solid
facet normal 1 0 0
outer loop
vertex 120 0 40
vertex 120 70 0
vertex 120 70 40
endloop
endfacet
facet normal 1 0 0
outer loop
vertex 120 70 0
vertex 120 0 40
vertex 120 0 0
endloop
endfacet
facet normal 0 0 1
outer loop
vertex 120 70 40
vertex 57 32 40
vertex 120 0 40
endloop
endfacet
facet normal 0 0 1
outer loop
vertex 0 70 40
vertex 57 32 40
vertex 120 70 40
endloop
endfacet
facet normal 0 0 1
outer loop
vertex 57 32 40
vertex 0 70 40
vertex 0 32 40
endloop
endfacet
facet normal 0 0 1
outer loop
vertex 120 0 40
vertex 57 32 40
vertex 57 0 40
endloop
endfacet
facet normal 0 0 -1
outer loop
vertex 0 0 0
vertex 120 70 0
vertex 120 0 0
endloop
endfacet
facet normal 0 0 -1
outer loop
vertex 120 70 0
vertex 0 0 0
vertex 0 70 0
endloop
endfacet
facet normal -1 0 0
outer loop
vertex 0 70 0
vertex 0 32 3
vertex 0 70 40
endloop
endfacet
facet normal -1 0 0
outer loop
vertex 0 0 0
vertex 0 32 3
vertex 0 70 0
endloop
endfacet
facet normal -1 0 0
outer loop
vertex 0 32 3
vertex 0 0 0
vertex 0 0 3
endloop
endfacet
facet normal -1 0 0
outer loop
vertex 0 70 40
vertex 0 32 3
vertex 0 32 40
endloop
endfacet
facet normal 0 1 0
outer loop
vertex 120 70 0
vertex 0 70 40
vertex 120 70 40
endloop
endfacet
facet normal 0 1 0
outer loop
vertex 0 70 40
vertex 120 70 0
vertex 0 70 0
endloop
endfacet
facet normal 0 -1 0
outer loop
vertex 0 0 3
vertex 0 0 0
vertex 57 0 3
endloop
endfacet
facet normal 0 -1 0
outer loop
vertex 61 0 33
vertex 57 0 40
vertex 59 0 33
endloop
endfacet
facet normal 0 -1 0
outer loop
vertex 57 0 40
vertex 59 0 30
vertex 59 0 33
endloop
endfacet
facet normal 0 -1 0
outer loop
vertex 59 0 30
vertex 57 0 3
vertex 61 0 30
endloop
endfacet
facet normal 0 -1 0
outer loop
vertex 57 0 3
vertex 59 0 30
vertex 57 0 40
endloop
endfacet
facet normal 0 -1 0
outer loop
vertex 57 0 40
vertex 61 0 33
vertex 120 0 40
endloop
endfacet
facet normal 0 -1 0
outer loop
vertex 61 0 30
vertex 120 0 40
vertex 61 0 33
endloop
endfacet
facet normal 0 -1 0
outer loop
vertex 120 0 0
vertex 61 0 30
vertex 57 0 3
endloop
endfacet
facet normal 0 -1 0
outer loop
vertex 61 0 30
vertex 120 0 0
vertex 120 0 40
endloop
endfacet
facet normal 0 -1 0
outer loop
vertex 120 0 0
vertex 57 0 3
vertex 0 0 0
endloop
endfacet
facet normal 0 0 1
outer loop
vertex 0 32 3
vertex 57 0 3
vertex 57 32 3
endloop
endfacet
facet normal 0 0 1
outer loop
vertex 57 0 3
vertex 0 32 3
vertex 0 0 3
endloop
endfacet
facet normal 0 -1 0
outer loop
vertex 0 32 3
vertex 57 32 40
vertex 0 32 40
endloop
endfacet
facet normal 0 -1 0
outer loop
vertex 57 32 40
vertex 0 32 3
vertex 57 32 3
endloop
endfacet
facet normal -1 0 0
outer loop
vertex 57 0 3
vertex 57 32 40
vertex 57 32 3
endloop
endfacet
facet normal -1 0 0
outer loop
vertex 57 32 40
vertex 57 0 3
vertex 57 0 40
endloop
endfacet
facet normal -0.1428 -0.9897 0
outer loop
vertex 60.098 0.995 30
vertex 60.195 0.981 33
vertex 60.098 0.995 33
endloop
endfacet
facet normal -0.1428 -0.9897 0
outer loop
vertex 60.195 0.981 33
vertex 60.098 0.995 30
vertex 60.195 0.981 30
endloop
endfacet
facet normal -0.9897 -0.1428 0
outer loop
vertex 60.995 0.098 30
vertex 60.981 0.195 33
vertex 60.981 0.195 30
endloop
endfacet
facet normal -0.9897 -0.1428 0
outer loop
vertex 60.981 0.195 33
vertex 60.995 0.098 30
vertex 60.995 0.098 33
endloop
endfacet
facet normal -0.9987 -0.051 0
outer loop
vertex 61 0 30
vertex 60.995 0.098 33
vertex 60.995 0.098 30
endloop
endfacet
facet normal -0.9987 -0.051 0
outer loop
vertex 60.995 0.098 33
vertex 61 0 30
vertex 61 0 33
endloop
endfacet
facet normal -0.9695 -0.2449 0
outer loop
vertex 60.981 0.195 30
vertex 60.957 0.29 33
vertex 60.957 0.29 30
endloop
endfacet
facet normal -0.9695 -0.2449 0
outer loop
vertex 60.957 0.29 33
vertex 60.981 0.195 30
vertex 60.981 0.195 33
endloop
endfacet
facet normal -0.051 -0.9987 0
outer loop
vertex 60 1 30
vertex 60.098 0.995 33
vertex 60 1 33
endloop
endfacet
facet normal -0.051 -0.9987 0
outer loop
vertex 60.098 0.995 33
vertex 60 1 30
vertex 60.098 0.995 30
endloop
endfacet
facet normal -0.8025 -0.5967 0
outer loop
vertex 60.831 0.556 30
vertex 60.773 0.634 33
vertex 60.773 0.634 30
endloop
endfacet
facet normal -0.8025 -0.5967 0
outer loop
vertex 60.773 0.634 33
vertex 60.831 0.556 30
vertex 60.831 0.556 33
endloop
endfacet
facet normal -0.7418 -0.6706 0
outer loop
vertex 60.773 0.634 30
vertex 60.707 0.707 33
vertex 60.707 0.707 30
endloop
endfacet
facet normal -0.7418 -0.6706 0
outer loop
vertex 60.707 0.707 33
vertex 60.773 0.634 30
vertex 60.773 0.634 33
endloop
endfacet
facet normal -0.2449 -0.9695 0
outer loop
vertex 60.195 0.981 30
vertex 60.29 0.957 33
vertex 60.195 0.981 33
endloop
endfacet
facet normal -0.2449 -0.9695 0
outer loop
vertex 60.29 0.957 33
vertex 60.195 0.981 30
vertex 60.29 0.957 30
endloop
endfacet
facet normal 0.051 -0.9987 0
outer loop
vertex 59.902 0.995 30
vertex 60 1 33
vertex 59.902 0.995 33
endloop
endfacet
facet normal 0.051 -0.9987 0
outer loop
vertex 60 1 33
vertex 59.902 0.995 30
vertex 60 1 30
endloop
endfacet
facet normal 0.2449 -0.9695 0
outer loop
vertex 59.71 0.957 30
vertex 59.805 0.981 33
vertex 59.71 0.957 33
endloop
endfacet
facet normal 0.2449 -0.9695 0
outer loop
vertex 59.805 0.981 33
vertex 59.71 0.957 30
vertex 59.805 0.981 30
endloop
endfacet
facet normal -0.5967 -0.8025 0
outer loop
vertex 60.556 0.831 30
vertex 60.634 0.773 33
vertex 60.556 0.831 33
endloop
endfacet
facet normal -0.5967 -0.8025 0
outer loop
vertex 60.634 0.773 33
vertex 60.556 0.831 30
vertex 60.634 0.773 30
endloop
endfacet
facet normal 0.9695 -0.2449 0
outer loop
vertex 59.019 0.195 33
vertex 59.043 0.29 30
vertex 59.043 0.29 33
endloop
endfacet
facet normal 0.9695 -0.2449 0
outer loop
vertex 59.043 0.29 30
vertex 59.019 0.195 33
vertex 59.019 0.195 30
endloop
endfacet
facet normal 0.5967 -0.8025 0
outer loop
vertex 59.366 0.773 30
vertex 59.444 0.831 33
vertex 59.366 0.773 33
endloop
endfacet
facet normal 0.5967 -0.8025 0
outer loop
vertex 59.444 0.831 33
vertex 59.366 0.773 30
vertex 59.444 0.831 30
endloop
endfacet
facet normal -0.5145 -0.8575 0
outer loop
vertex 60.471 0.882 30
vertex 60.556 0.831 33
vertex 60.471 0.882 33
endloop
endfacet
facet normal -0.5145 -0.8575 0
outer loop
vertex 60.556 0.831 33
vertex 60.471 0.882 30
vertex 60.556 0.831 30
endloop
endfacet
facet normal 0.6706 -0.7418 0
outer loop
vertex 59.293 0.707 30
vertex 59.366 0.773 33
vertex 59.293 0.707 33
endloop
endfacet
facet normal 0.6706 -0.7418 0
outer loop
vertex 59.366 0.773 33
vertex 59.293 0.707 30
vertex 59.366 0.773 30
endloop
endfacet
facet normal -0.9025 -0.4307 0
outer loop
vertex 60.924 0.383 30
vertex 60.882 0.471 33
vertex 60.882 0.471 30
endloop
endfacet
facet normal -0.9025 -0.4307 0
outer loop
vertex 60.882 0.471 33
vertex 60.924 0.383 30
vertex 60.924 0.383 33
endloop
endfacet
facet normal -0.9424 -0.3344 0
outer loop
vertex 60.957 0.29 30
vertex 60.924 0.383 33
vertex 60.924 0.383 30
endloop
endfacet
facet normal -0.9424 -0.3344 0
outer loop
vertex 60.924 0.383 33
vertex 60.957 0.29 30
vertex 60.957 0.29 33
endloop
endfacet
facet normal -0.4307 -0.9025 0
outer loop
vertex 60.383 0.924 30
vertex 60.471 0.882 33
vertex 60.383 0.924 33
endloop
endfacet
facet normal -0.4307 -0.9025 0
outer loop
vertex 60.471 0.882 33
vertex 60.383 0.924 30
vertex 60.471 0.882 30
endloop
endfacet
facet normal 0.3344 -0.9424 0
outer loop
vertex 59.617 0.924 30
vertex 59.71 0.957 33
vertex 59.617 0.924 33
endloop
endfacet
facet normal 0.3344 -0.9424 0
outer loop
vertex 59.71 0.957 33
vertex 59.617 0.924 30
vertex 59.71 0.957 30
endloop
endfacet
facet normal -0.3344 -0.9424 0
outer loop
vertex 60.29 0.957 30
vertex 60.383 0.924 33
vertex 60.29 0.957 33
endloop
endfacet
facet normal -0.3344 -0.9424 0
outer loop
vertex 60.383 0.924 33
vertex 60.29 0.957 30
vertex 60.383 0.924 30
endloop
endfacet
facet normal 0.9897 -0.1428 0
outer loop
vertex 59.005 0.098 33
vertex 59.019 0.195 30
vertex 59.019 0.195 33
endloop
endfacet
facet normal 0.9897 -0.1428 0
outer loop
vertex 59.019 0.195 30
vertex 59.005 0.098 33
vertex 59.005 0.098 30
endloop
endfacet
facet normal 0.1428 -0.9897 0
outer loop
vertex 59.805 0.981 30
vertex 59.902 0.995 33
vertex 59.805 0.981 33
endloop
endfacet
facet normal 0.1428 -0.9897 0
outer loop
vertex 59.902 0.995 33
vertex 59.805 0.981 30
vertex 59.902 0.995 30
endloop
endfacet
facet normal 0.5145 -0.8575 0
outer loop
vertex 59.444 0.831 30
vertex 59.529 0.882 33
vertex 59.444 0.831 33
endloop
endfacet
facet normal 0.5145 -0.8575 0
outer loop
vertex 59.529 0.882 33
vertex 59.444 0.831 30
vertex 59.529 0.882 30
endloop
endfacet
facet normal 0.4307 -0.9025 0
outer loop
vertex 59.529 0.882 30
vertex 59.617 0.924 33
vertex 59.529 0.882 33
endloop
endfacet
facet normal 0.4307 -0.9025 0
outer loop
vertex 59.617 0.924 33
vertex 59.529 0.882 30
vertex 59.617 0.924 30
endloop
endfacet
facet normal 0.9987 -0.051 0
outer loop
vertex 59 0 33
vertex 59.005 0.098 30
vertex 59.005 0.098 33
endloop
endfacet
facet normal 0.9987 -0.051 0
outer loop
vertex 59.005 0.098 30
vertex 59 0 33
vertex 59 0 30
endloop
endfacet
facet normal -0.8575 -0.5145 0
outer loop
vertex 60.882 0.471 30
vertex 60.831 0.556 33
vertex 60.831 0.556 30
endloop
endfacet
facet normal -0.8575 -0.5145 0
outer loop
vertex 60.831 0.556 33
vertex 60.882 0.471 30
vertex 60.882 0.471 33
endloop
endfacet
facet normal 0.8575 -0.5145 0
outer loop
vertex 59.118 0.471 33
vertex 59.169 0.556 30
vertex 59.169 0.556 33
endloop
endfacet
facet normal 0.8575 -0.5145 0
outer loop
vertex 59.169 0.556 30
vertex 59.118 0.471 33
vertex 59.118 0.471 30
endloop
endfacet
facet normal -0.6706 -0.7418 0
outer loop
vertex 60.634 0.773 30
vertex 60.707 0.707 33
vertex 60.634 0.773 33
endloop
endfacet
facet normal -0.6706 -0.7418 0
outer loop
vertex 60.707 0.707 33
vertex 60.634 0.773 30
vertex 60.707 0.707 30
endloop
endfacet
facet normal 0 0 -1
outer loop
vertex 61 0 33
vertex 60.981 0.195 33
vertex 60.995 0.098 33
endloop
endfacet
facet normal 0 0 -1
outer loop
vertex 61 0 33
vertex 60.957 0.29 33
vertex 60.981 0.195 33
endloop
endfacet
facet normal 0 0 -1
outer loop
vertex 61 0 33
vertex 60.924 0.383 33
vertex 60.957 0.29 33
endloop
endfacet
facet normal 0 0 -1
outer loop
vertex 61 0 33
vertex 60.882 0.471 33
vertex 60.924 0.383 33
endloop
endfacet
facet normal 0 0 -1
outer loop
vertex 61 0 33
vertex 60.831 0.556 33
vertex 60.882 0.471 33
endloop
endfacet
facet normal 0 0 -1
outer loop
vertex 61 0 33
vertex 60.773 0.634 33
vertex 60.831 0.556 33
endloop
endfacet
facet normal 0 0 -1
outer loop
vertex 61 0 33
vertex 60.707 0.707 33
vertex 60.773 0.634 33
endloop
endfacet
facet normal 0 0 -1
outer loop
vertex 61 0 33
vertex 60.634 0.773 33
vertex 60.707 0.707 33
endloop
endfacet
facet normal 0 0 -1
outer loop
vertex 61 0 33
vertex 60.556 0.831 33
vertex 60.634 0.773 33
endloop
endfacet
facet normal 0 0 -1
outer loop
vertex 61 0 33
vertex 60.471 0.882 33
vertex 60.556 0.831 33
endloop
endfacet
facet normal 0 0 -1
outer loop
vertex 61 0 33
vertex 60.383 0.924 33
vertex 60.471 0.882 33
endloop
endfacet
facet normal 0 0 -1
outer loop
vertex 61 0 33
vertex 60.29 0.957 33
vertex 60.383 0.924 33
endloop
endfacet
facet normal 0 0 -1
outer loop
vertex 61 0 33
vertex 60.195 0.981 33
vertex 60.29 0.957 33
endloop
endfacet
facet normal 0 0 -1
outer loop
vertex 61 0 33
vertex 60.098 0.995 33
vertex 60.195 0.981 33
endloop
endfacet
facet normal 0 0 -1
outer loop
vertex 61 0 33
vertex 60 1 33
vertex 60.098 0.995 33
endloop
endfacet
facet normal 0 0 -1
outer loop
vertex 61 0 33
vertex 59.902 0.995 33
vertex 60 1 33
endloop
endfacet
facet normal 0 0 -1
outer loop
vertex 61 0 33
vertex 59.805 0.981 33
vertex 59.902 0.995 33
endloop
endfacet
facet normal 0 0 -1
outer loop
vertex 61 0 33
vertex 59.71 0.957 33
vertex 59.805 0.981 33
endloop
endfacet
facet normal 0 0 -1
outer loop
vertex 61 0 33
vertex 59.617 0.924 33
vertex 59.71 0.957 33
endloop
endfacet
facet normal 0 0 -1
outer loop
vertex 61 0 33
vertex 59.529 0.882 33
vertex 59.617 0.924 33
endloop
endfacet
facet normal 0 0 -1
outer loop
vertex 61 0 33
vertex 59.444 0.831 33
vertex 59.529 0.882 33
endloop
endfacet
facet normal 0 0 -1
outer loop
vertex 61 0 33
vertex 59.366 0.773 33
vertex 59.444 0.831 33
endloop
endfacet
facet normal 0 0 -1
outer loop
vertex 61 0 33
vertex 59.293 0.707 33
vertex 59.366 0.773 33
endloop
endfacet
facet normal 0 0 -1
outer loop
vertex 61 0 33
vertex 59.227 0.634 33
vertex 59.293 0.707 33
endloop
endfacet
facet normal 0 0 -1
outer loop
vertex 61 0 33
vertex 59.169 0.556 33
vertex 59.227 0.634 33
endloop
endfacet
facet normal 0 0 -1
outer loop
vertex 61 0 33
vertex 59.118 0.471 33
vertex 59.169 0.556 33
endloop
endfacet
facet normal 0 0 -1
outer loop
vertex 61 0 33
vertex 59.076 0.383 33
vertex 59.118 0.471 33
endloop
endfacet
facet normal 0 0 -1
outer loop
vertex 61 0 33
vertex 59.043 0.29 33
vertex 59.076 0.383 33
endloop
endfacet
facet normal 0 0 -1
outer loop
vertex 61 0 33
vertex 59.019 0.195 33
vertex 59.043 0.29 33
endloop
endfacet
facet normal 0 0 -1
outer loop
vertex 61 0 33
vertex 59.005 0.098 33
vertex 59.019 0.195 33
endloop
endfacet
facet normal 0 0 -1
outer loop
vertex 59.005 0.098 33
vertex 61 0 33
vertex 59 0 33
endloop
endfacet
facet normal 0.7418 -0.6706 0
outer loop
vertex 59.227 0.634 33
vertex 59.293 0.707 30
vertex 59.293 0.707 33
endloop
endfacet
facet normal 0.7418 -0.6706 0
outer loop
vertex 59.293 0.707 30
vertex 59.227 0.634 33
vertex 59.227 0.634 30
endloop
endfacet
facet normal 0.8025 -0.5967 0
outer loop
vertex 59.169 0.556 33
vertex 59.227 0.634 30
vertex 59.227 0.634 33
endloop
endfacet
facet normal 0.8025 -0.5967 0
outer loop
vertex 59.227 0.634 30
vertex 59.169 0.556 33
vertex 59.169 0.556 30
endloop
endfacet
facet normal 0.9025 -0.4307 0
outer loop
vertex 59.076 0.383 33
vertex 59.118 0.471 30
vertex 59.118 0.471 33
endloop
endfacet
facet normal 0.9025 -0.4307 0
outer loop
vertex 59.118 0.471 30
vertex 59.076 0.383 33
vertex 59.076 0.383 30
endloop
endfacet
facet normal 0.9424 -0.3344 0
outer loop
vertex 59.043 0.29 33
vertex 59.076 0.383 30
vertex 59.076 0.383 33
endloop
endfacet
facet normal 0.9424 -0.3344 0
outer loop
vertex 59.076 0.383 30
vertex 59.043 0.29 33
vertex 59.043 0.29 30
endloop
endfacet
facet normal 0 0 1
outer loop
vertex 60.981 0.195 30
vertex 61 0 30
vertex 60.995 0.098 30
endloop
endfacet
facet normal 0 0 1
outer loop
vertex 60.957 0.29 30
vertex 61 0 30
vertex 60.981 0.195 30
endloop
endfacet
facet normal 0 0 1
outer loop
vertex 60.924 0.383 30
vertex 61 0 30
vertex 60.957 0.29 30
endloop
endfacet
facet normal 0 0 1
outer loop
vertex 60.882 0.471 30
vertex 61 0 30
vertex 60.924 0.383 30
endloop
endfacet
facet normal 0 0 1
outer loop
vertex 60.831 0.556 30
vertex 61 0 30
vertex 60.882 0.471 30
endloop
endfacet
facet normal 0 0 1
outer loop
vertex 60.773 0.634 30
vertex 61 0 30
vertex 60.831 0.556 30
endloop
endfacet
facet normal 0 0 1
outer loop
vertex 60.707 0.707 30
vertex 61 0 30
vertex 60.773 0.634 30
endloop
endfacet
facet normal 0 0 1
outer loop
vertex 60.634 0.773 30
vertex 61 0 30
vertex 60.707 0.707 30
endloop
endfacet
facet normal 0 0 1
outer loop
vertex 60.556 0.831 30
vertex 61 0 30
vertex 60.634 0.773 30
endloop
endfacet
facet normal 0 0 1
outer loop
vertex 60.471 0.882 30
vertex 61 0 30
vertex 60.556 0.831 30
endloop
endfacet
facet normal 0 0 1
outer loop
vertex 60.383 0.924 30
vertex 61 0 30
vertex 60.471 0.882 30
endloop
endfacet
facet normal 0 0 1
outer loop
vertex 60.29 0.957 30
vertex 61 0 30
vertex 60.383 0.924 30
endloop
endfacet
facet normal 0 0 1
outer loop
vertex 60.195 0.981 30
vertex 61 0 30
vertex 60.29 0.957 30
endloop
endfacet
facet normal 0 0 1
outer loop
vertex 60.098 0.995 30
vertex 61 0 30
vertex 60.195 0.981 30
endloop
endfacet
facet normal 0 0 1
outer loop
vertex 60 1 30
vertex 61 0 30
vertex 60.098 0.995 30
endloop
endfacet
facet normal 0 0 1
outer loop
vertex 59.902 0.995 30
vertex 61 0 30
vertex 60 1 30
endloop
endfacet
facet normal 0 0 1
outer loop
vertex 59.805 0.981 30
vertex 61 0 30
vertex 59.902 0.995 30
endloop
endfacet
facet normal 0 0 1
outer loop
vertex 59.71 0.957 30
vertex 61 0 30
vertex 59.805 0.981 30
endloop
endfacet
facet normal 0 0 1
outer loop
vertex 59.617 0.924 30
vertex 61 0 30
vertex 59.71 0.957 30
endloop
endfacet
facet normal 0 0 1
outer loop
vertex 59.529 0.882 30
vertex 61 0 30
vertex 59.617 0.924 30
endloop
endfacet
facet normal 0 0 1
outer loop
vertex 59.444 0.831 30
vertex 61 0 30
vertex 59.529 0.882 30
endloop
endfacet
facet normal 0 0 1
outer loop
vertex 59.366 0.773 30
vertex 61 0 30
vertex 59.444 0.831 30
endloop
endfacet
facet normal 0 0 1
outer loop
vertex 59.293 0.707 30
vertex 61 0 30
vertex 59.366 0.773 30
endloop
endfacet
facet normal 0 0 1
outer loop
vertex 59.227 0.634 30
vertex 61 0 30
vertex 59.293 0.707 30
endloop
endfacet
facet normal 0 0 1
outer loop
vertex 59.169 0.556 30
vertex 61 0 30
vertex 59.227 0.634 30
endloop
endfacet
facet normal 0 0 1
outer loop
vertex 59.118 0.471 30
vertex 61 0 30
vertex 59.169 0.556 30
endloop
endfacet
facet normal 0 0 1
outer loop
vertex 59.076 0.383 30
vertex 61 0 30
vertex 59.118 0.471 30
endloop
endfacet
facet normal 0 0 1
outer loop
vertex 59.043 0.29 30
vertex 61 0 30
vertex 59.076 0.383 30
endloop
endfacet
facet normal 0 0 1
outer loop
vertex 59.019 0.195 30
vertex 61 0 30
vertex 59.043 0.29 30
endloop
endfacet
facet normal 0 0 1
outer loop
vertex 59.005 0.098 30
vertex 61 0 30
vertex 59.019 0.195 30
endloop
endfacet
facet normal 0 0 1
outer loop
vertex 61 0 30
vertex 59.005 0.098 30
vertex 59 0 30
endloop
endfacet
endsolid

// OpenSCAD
difference() {
            union() {
                cube([120, 70, 40]);
                translate([-30, -32, 3]) cube([60, 64, 10]);
            }
            translate([-57, -32, 3]) cube([114, 64, 37]);
            translate([-60, 0, 30]) cylinder(d=2, h=3, $fn=64);
            translate([60, 0, 30]) cylinder(d=2, h=3, $fn=64);
        }
